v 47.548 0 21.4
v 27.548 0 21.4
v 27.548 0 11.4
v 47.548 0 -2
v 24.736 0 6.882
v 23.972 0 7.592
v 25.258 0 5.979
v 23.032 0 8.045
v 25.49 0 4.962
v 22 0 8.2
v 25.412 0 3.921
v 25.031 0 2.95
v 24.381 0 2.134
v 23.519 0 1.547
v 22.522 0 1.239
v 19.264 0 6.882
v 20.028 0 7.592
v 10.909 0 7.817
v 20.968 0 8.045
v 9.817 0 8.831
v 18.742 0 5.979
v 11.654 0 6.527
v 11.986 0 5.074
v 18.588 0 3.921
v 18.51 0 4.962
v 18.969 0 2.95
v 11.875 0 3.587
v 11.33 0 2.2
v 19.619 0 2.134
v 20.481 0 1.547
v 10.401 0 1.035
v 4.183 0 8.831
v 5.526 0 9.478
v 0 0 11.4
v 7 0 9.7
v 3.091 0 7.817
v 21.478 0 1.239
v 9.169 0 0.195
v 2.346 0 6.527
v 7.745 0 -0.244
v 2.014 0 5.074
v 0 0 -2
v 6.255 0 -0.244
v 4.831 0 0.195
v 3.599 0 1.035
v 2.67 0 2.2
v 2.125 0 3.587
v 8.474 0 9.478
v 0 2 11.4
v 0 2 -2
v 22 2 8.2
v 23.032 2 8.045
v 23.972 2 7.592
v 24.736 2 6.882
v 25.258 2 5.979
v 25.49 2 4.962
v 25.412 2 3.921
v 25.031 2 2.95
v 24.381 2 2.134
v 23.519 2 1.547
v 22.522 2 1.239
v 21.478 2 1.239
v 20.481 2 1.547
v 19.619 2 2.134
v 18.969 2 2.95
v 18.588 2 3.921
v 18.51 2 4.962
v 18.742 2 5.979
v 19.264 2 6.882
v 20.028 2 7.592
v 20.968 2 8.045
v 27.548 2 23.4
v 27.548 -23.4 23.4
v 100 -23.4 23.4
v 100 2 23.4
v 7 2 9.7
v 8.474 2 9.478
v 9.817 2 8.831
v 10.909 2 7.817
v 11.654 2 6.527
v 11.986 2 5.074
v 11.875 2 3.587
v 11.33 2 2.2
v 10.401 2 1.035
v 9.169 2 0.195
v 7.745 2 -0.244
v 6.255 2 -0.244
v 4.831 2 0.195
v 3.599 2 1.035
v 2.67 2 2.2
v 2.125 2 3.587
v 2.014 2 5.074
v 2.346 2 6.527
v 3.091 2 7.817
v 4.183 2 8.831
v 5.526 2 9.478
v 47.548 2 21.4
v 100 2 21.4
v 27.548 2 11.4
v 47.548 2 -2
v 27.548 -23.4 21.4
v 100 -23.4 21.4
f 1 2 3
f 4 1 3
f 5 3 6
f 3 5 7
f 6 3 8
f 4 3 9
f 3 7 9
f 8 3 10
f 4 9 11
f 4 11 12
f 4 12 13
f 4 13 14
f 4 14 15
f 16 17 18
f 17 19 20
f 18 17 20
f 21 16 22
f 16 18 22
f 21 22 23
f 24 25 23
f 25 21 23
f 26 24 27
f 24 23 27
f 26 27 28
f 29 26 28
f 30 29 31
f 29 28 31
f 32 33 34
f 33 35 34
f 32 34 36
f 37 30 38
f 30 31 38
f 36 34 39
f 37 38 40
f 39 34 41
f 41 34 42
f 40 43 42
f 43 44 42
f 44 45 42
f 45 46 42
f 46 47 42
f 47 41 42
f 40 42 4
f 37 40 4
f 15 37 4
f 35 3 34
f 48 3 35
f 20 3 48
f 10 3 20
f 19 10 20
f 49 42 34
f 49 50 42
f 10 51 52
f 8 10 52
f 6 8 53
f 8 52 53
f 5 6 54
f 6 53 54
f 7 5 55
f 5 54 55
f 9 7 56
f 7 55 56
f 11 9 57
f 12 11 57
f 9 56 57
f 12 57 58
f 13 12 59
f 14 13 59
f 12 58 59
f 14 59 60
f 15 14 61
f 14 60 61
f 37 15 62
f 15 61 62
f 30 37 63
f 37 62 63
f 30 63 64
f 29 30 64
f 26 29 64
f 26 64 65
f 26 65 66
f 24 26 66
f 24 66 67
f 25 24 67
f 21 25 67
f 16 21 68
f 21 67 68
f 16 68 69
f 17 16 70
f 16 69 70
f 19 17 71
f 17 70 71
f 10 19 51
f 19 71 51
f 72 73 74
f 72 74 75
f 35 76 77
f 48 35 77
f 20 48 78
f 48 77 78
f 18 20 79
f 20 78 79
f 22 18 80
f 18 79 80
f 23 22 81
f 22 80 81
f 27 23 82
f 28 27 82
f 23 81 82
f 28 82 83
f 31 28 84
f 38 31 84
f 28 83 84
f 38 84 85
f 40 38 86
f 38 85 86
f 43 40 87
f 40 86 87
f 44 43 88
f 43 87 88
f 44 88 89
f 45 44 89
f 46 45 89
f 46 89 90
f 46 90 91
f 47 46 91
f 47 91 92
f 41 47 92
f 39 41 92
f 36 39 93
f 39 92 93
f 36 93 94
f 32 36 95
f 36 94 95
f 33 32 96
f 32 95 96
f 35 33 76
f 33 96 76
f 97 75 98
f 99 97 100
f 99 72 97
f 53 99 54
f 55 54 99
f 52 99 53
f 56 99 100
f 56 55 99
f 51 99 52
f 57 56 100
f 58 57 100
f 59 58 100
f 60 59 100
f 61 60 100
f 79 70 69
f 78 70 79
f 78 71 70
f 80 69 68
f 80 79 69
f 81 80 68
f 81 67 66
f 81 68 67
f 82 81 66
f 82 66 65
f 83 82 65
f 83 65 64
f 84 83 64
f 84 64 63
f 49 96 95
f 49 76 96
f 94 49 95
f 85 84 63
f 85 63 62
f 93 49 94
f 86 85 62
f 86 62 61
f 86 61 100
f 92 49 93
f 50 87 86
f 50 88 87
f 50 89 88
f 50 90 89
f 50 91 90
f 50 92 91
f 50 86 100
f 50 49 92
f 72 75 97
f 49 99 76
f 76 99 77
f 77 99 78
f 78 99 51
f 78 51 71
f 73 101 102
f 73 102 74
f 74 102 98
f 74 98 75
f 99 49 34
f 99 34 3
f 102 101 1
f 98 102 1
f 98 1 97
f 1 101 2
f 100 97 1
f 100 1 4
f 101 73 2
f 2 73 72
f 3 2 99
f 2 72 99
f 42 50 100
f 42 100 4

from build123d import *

# Parameters (mm, degrees)
SALIENTE_EXTRUIR1_DEPTH = 100
CROQUIS3_R              = 5
CROQUIS3_R_2            = 3.5
CROQUIS3_W              = 52.452137676
CROQUIS3_H              = 23.4
CORTAR_EXTRUIR1_DEPTH   = 2
CORTAR_EXTRUIR2_REACH   = 107.333
CROQUIS4_W              = 27.547862324
CROQUIS4_H              = 23.4


with BuildPart() as part:
    # Croquis2 → Saliente-Extruir1 (new body)
    with BuildSketch(Plane(origin=(0, 0, 0), x_dir=(0, 0, -1), z_dir=(1, 0, 0))):
        Polygon((0, 0), (-21.4, 0), (-21.4, -21.4), (-21.4, -23.4), (-23.4, -23.4), (-23.4, 2), (2, 2), (2, 0), align=None)
    extrude(amount=SALIENTE_EXTRUIR1_DEPTH)

    # Croquis3 → Cortar-Extruir1 (cut)
    with BuildSketch(Plane(origin=(0, 2, 0), x_dir=(1, 0, 0), z_dir=(0, 1, 0))):
        with Locations(Location((7, -4.7, 0), (0, 0, 270))):
            Circle(CROQUIS3_R)
        with Locations(Location((22, -4.7, 0), (0, 0, 270))):
            Circle(CROQUIS3_R_2)
        with Locations((73.773931162, -9.7)):
            Rectangle(CROQUIS3_W, CROQUIS3_H)
        Polygon((0, -21.4), (0, -11.4), (27.547862324, -11.4), (27.547862324, -21.4), (27.547862324, -23.4), (0, -23.4), align=None)
    extrude(amount=-CORTAR_EXTRUIR1_DEPTH, mode=Mode.SUBTRACT)

    # Croquis4 → Cortar-Extruir2 (cut, up to next)
    with BuildSketch(Plane(origin=(0, 0, 21.4), x_dir=(-1, 0, 0), z_dir=(0, 0, -1)), mode=Mode.PRIVATE) as cortar_extruir2_sk1:
        with Locations((-13.773931162, -11.7)):
            Rectangle(CROQUIS4_W, CROQUIS4_H)
    cortar_extruir2_tool1 = extrude(cortar_extruir2_sk1.sketch, amount=-CORTAR_EXTRUIR2_REACH, mode=Mode.PRIVATE) & part.part
    add(cortar_extruir2_tool1.solids().sort_by_distance((13.773931, -11.7, 21.4))[0], mode=Mode.SUBTRACT)


solid = part.part
